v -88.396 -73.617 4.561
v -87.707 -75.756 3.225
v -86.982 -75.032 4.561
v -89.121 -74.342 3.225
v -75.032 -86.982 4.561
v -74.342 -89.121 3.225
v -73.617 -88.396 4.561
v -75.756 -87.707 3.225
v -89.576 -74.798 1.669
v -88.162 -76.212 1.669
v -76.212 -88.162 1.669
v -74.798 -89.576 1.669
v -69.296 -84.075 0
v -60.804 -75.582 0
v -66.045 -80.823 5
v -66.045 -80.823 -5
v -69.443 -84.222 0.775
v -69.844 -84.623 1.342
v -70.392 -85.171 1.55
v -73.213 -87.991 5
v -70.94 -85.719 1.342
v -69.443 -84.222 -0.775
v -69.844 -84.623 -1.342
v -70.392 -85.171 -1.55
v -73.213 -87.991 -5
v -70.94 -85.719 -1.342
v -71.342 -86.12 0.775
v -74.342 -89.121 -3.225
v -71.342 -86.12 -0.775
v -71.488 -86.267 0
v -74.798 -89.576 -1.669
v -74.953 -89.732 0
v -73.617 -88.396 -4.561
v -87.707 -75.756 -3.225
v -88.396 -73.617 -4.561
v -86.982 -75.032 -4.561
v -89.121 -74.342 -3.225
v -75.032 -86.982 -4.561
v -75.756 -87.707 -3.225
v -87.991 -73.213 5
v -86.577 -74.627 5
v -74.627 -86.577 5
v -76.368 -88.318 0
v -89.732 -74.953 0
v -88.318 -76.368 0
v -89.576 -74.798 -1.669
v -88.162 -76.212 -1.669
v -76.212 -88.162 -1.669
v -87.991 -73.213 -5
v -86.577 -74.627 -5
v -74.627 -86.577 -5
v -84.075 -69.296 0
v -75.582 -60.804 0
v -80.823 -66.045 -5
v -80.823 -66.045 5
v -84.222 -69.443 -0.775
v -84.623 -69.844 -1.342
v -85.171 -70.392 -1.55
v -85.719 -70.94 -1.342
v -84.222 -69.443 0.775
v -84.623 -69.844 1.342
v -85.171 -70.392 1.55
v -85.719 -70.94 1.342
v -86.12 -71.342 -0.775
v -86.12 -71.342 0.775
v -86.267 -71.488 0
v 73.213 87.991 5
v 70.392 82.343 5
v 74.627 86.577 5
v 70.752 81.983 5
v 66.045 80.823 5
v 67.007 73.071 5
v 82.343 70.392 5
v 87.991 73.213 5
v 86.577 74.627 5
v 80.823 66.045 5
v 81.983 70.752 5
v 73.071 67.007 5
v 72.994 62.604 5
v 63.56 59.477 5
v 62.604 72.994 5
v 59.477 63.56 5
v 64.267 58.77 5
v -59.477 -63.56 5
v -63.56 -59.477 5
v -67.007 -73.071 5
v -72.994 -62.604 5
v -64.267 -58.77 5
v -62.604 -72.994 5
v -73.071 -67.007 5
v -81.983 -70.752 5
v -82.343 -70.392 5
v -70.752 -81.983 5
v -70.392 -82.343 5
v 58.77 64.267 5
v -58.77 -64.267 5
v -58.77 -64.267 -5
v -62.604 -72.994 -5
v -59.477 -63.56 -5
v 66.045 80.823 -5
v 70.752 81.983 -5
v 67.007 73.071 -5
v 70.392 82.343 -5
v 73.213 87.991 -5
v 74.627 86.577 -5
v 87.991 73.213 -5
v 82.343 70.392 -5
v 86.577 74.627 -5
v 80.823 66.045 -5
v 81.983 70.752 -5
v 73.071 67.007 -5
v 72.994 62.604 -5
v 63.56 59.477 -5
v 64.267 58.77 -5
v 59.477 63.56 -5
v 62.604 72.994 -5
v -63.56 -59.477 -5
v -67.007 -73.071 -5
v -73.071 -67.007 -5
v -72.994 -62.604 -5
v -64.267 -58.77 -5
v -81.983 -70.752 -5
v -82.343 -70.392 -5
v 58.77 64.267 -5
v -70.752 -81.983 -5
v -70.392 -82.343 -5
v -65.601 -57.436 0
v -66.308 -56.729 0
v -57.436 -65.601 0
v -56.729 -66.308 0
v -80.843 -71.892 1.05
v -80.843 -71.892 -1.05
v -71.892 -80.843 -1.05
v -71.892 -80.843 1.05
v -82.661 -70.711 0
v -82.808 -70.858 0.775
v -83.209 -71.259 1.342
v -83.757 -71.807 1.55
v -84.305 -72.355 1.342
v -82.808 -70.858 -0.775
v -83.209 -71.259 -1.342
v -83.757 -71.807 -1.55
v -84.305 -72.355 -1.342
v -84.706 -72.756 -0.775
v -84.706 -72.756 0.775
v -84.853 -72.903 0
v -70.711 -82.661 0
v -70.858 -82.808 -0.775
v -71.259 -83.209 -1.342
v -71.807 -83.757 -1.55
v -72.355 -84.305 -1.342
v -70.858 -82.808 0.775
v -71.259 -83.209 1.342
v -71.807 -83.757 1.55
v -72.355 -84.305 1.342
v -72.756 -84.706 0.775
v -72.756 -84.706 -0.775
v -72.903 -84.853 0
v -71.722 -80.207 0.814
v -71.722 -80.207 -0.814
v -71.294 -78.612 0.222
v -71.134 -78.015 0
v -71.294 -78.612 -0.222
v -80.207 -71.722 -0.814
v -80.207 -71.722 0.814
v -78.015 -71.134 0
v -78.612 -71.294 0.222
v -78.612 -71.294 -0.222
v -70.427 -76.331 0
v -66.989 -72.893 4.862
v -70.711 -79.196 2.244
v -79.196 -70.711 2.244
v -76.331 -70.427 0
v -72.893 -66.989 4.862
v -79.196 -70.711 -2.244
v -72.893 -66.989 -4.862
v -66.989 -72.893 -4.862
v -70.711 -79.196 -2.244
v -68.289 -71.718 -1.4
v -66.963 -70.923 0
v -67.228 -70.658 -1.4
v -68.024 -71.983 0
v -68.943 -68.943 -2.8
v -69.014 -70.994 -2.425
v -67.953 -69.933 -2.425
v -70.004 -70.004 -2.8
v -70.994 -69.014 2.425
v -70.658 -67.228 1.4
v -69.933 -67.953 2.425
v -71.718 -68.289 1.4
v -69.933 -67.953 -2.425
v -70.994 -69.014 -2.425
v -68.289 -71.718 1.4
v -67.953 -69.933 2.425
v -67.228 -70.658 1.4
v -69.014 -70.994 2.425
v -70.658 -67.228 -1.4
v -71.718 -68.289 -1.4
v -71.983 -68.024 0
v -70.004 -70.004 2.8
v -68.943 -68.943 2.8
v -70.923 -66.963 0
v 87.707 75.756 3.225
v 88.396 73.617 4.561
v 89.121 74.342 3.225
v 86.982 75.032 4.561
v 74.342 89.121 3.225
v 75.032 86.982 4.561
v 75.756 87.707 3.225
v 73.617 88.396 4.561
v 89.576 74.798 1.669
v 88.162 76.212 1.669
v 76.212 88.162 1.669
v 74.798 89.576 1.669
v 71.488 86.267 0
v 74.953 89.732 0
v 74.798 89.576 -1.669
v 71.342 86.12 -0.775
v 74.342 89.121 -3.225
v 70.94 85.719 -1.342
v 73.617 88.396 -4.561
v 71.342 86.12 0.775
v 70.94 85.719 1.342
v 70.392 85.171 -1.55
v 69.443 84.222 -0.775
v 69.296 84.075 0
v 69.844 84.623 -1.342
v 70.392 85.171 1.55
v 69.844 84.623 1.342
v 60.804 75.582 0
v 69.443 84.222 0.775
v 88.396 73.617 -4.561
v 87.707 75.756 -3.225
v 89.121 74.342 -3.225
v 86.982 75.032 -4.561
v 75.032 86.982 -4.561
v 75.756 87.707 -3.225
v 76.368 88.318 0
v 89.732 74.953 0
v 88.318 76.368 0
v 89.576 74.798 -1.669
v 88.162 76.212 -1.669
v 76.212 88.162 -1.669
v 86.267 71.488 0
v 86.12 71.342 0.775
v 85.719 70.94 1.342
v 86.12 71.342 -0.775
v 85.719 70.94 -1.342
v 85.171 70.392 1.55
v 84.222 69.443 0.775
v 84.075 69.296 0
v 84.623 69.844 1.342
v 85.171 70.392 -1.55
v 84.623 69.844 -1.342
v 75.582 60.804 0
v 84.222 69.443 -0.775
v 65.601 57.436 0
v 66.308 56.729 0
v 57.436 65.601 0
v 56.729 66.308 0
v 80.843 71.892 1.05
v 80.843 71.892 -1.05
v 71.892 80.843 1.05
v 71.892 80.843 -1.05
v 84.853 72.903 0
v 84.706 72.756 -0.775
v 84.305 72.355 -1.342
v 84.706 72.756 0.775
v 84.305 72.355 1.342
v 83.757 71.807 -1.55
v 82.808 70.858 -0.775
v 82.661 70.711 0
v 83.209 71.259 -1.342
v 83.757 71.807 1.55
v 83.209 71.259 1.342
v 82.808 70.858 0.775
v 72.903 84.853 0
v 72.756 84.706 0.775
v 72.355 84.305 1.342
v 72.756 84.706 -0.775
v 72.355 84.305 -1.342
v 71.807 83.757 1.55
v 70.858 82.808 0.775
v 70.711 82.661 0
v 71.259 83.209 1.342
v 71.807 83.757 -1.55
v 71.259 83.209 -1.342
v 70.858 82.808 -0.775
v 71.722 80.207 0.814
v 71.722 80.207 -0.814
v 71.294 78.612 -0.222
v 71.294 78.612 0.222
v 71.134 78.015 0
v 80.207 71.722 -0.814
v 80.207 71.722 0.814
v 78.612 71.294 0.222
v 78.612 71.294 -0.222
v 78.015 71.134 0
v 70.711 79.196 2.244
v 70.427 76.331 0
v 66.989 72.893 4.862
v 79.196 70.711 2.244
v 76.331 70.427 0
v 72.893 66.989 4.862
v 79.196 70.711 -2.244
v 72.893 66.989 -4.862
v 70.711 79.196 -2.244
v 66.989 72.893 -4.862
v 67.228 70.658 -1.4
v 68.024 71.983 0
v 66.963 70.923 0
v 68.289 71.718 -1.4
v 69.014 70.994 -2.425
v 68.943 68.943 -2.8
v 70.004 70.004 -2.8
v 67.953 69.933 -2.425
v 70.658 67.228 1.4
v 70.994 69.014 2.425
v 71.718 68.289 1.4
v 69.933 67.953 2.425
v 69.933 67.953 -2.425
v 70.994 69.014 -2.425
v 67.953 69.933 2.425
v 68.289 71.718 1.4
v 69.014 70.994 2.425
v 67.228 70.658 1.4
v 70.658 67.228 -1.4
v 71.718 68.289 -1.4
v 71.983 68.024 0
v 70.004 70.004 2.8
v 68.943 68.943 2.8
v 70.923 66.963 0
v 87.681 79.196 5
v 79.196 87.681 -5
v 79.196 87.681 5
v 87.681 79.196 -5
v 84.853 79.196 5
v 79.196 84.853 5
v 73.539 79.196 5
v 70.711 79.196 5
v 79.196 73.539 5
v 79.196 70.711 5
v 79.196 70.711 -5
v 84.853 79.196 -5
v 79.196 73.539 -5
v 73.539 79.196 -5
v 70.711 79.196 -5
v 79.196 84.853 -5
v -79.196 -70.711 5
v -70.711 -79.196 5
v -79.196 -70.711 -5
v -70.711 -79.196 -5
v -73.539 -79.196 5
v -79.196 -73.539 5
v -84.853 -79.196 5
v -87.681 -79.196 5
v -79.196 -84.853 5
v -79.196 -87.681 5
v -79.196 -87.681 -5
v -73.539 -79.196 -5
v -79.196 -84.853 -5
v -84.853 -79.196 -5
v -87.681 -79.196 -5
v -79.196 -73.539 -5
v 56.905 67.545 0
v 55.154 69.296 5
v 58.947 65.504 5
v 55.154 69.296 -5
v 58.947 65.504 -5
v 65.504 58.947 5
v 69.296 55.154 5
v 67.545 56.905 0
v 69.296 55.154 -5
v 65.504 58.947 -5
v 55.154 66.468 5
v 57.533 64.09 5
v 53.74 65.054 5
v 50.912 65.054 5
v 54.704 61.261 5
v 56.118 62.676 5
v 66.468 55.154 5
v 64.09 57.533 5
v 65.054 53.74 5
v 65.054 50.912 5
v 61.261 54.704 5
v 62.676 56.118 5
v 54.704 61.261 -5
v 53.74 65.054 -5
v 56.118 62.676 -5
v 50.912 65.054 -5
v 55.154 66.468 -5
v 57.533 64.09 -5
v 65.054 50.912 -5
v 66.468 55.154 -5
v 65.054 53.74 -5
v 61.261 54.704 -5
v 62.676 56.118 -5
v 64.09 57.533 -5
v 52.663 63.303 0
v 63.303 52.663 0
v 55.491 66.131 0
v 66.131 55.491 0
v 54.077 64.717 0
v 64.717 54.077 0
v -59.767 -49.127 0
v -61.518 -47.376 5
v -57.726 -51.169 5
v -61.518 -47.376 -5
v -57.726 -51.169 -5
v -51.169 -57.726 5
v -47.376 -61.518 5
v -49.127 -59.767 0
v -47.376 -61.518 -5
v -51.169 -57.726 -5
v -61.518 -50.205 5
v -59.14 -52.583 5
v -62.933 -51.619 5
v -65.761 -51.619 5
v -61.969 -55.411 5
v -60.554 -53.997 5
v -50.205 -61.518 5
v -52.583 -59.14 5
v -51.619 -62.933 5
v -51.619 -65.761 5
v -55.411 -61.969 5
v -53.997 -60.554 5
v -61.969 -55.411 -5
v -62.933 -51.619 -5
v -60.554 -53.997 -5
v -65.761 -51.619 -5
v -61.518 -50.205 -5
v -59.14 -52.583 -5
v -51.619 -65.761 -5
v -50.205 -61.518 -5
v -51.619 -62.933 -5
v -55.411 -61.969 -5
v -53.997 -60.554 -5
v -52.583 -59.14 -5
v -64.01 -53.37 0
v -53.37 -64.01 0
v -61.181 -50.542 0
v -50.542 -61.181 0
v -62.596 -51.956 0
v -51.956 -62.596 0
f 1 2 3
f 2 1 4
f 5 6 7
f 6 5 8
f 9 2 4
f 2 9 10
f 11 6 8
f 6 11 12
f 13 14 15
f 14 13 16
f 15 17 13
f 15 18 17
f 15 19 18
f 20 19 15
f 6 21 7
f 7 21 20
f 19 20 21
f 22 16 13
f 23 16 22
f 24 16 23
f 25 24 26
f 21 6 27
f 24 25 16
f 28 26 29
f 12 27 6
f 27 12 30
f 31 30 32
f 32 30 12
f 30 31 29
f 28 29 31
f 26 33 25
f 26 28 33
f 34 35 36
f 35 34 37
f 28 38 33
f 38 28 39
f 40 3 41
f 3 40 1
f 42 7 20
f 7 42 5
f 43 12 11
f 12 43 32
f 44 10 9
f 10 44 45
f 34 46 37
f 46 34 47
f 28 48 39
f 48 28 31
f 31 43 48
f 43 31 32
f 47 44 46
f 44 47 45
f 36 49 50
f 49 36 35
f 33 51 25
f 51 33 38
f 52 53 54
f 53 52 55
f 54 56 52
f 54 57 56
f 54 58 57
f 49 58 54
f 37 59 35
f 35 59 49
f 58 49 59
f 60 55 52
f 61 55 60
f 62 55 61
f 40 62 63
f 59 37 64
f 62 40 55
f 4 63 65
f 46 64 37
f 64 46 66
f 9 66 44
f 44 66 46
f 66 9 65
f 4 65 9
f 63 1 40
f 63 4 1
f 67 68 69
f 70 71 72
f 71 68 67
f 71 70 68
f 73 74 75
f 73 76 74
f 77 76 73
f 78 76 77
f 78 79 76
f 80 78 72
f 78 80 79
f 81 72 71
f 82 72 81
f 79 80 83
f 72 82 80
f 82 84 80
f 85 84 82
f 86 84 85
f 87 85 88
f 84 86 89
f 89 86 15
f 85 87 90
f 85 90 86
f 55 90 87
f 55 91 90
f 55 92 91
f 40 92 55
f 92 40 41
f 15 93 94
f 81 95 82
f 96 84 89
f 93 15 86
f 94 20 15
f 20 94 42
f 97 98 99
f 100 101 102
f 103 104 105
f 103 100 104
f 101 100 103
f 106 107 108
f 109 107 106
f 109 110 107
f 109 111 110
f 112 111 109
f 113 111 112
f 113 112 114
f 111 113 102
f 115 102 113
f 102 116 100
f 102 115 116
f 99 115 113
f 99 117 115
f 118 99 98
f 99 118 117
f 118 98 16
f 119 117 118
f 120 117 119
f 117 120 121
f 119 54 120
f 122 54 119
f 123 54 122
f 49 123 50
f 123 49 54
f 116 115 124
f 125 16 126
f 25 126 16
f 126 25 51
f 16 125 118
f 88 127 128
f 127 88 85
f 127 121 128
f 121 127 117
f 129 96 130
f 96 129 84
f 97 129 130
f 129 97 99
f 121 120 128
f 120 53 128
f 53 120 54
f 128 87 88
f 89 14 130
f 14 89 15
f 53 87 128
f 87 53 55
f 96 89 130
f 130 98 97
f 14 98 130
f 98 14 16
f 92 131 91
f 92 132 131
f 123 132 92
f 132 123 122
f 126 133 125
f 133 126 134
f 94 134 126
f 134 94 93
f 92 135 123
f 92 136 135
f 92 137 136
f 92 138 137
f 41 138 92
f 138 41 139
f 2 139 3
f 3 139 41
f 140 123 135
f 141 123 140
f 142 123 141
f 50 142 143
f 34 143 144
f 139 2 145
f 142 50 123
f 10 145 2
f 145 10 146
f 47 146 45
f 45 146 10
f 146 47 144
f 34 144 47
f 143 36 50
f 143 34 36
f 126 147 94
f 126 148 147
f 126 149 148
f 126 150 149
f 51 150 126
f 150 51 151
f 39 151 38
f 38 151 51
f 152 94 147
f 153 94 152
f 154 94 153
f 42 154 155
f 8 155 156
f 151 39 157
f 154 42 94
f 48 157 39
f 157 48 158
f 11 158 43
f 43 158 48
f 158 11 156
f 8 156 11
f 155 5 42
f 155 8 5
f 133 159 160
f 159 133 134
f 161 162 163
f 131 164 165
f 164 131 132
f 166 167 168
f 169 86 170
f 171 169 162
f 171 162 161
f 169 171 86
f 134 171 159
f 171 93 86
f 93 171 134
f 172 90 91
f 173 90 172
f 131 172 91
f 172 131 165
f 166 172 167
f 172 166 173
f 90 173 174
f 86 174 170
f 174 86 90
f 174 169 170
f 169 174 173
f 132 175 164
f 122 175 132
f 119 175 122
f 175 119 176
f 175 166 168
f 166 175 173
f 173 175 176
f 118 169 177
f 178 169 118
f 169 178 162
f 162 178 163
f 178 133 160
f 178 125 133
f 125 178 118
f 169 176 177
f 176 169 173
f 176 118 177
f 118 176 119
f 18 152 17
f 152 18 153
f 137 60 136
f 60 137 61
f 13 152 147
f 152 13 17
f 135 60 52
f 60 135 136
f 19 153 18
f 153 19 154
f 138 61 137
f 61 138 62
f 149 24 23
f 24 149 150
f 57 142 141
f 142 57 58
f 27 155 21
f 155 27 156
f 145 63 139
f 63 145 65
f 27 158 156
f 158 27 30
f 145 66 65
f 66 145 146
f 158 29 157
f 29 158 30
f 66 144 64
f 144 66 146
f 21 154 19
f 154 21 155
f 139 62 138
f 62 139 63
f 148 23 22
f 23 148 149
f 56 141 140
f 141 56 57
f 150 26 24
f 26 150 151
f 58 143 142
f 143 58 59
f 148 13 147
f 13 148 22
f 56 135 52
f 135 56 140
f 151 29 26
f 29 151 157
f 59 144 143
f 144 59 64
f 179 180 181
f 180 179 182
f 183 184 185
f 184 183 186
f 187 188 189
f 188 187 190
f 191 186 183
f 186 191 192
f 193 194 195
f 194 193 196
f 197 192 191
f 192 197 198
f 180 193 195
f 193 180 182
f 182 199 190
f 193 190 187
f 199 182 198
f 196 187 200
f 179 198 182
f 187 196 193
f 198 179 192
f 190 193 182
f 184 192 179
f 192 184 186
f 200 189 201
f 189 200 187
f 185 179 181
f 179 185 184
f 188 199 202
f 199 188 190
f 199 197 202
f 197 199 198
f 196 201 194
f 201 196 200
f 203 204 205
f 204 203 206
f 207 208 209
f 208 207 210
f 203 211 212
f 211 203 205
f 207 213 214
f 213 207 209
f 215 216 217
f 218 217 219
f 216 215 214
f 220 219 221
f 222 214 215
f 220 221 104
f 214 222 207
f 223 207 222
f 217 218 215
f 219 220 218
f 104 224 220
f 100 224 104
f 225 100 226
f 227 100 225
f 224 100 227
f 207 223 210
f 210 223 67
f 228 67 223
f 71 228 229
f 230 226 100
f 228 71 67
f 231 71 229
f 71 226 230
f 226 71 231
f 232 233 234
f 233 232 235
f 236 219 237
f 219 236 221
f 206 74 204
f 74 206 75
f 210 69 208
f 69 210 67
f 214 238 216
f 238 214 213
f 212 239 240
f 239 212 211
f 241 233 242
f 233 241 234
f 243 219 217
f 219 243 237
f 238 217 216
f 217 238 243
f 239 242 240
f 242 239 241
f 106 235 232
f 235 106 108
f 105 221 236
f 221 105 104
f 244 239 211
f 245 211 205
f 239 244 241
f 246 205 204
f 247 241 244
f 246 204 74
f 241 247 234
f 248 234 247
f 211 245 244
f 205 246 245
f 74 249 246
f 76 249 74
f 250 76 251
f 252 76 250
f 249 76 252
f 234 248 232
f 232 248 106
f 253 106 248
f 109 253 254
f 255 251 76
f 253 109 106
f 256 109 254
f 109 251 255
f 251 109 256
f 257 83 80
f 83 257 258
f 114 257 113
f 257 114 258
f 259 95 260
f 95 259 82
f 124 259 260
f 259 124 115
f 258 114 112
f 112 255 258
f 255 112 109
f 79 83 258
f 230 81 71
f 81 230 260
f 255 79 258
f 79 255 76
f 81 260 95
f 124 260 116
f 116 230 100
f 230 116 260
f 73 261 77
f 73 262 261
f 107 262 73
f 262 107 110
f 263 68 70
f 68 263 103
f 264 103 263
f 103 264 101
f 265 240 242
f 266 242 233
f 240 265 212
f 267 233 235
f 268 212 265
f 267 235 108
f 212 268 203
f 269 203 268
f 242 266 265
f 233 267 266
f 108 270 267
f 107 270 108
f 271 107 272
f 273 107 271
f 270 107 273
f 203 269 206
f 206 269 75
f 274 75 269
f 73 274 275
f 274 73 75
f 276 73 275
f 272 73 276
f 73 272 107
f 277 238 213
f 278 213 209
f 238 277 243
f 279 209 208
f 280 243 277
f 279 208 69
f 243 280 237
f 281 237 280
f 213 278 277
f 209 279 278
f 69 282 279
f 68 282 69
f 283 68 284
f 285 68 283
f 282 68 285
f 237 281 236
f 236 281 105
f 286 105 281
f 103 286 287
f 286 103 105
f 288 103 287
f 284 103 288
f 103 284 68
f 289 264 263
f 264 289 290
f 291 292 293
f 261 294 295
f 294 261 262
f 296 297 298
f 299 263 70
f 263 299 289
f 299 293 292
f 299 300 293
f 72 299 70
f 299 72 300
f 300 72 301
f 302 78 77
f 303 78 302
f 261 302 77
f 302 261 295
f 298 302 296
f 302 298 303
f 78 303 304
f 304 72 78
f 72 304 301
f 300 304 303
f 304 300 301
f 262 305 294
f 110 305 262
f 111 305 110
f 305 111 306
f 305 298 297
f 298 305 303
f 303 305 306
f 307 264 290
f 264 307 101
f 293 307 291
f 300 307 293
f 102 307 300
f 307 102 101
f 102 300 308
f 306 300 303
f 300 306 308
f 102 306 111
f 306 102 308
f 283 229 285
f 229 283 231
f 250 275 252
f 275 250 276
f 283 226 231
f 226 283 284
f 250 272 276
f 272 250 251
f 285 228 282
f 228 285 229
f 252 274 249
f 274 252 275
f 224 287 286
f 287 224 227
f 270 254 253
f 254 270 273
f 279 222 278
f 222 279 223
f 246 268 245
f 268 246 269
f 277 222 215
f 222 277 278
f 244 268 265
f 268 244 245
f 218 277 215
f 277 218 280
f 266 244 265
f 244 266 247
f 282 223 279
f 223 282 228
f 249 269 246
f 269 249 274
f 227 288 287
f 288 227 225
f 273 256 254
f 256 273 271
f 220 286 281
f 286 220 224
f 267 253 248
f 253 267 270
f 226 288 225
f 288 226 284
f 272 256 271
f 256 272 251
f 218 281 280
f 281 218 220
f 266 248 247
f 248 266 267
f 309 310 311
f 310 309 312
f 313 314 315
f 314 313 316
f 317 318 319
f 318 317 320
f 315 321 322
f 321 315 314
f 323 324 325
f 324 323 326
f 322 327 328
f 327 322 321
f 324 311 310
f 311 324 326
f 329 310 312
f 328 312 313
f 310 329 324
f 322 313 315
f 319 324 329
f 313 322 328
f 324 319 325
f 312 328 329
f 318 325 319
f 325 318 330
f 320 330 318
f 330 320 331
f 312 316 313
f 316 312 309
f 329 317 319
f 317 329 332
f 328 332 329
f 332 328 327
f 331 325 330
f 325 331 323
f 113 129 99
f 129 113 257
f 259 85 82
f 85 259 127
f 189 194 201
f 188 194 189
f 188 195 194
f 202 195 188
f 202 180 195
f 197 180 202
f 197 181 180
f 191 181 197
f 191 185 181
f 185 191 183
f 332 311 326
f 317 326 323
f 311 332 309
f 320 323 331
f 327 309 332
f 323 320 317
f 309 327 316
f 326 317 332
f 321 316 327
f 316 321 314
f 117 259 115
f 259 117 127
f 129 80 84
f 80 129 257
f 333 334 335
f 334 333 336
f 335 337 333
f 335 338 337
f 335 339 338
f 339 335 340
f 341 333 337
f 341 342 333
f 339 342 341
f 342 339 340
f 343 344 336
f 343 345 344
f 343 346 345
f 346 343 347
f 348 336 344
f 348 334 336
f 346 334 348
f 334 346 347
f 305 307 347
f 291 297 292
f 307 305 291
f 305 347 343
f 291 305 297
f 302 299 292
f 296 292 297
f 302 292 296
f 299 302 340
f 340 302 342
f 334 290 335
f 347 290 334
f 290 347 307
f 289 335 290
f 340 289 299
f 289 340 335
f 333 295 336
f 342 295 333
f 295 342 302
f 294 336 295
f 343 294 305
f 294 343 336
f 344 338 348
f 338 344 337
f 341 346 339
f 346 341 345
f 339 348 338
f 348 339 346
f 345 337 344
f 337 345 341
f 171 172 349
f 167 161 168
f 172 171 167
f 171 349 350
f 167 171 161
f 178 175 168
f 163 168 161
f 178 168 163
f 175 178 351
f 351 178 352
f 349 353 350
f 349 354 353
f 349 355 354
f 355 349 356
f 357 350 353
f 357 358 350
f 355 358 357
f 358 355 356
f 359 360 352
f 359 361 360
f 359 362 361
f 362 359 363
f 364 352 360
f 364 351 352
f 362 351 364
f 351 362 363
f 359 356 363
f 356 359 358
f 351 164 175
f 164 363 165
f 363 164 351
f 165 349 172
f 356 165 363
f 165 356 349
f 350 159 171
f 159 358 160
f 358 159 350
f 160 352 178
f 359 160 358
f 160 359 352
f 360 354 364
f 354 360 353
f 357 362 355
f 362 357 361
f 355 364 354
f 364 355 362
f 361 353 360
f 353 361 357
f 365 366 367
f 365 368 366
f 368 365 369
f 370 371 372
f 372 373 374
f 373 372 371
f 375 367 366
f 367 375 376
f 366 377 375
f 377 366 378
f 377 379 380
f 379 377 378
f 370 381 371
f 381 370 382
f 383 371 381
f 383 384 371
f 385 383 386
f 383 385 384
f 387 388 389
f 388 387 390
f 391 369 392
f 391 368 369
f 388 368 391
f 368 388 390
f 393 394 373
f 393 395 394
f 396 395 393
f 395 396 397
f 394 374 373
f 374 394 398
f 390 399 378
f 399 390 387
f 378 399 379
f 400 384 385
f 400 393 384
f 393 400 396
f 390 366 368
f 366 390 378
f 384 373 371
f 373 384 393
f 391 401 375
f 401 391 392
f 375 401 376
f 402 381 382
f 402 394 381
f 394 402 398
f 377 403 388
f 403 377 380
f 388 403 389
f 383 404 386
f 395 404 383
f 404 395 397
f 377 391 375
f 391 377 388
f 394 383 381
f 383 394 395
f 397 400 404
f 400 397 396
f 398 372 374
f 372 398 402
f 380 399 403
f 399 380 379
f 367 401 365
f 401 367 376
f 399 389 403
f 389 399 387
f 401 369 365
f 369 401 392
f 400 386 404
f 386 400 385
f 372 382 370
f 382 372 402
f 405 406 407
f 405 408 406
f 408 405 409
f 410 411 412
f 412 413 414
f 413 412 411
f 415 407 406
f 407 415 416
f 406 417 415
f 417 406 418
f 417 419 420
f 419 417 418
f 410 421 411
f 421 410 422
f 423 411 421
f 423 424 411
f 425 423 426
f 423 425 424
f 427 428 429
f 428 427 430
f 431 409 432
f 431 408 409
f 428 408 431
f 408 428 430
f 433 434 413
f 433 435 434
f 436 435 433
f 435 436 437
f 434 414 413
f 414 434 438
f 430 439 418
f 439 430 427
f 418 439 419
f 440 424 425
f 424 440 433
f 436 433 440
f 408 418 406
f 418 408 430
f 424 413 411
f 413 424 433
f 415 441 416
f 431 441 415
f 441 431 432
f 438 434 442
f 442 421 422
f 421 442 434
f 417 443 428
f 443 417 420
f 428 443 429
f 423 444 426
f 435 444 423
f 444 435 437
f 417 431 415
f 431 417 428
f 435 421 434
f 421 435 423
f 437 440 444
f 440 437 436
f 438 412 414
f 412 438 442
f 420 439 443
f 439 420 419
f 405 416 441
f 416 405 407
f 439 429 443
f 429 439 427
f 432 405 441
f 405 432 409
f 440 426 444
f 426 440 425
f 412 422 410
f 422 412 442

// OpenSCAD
// file: jaws.scad
h = 10;
r = h/2 / cos(30) + 1;
co = 16.9;		// attachment thickness
mt = 4;		// mount thickness

module jaws() {
  difference() {
    union() {
      intersection () {
        rotate([90, 0, 0]) cylinder(r = co / 2 - mt / 2, h = co + mt, center=true, $fn=24);
        translate([-4, 0, 0]) cube([20, 24, h], center=true);
      }
      intersection() {
        translate([10, 0, 0]) cube([26, co + mt, h], center=true);
        translate([10, 0, 0]) rotate([0, 90, 0]) rotate([0, 0, 30])
          cylinder(r1=co, r2=r, h=26, center=true, $fn=6);
      }
    } 
    translate([-4.5, 0, 0]) cube([h + 3, co, h + 3], center=true);
    translate([-1.5, 0, 0]) rotate([0, 0, 30])
      cylinder(r=co / 2 - 0.1, h=10, center=true, $fn=6);
    translate([0, 0, 4]) rotate([0, 45, 0])
      rotate([0, 0, 30]) cylinder(r=co / 2 - 0.1, h = co, center=true, $fn=6);
    translate([0, 0, -4]) rotate([0, -45, 0])
      rotate([0, 0, 30]) cylinder(r=co / 2 - 0.1, h = co, center=true, $fn=6);
    rotate([90, 0, 0]) cylinder(r=1.55, h=40, center=true, $fn=12);
    translate([21, 0, 0]) rotate([0, 90, 0])
      cylinder(r=2.8, h=20, center=true, $fn=12); 
  }
}

translate([0, 0, h/2]) jaws();
// main file
use <jaws.scad>;

l = 220;
h = 10;
r = h/2 / cos(30);

// Wipe nozzle after long travel moves.
module collar() {
  difference() {
    cube([6, 20, h], center=true);
    cube([2, 16, h+1], center=true);
    rotate([0, 90, 0]) rotate([0, 0, 30])
      cylinder(r=r + 1.75, h=7, center=true, $fn=6);
  }
}

// Small hollow cube.
module cubicle() {
  difference() {
    cube([12, 12, h], center=true);
    cube([8, 8, h+1], center=true);
  }
}

// Nozzle wipers.
module wipers() {
  translate([l/2 + 2, 0, 0]) cubicle();
  translate([-l/2 - 2, 0, 0]) cubicle();
  translate([l/2 - 25, 0, 0]) collar();
  translate([-l/2 + 30, 0, 0]) collar();
}

// Rod with two Y shaped rod ends.
module rod() {
  union() {
    translate([-l/2, 0, 0]) jaws();
    translate([l/2, 0, 0]) rotate([0, 0, 180]) jaws();
    rotate([0, 90, 0]) rotate([0, 0, 30])
      cylinder(r=r, h=l-25, center=true, $fn=6);
  }
}

rotate([0, 0, 45]) rod();

// If your nozzle doesn't ooze at all, you can comment the next line out.
rotate([0, 0, 45]) wipers();

// Print platform.
bed = 8*25.4; // 8x8 inches.
% translate([0, 0, -h/2-1]) cube([bed, bed, 2], center=true);
